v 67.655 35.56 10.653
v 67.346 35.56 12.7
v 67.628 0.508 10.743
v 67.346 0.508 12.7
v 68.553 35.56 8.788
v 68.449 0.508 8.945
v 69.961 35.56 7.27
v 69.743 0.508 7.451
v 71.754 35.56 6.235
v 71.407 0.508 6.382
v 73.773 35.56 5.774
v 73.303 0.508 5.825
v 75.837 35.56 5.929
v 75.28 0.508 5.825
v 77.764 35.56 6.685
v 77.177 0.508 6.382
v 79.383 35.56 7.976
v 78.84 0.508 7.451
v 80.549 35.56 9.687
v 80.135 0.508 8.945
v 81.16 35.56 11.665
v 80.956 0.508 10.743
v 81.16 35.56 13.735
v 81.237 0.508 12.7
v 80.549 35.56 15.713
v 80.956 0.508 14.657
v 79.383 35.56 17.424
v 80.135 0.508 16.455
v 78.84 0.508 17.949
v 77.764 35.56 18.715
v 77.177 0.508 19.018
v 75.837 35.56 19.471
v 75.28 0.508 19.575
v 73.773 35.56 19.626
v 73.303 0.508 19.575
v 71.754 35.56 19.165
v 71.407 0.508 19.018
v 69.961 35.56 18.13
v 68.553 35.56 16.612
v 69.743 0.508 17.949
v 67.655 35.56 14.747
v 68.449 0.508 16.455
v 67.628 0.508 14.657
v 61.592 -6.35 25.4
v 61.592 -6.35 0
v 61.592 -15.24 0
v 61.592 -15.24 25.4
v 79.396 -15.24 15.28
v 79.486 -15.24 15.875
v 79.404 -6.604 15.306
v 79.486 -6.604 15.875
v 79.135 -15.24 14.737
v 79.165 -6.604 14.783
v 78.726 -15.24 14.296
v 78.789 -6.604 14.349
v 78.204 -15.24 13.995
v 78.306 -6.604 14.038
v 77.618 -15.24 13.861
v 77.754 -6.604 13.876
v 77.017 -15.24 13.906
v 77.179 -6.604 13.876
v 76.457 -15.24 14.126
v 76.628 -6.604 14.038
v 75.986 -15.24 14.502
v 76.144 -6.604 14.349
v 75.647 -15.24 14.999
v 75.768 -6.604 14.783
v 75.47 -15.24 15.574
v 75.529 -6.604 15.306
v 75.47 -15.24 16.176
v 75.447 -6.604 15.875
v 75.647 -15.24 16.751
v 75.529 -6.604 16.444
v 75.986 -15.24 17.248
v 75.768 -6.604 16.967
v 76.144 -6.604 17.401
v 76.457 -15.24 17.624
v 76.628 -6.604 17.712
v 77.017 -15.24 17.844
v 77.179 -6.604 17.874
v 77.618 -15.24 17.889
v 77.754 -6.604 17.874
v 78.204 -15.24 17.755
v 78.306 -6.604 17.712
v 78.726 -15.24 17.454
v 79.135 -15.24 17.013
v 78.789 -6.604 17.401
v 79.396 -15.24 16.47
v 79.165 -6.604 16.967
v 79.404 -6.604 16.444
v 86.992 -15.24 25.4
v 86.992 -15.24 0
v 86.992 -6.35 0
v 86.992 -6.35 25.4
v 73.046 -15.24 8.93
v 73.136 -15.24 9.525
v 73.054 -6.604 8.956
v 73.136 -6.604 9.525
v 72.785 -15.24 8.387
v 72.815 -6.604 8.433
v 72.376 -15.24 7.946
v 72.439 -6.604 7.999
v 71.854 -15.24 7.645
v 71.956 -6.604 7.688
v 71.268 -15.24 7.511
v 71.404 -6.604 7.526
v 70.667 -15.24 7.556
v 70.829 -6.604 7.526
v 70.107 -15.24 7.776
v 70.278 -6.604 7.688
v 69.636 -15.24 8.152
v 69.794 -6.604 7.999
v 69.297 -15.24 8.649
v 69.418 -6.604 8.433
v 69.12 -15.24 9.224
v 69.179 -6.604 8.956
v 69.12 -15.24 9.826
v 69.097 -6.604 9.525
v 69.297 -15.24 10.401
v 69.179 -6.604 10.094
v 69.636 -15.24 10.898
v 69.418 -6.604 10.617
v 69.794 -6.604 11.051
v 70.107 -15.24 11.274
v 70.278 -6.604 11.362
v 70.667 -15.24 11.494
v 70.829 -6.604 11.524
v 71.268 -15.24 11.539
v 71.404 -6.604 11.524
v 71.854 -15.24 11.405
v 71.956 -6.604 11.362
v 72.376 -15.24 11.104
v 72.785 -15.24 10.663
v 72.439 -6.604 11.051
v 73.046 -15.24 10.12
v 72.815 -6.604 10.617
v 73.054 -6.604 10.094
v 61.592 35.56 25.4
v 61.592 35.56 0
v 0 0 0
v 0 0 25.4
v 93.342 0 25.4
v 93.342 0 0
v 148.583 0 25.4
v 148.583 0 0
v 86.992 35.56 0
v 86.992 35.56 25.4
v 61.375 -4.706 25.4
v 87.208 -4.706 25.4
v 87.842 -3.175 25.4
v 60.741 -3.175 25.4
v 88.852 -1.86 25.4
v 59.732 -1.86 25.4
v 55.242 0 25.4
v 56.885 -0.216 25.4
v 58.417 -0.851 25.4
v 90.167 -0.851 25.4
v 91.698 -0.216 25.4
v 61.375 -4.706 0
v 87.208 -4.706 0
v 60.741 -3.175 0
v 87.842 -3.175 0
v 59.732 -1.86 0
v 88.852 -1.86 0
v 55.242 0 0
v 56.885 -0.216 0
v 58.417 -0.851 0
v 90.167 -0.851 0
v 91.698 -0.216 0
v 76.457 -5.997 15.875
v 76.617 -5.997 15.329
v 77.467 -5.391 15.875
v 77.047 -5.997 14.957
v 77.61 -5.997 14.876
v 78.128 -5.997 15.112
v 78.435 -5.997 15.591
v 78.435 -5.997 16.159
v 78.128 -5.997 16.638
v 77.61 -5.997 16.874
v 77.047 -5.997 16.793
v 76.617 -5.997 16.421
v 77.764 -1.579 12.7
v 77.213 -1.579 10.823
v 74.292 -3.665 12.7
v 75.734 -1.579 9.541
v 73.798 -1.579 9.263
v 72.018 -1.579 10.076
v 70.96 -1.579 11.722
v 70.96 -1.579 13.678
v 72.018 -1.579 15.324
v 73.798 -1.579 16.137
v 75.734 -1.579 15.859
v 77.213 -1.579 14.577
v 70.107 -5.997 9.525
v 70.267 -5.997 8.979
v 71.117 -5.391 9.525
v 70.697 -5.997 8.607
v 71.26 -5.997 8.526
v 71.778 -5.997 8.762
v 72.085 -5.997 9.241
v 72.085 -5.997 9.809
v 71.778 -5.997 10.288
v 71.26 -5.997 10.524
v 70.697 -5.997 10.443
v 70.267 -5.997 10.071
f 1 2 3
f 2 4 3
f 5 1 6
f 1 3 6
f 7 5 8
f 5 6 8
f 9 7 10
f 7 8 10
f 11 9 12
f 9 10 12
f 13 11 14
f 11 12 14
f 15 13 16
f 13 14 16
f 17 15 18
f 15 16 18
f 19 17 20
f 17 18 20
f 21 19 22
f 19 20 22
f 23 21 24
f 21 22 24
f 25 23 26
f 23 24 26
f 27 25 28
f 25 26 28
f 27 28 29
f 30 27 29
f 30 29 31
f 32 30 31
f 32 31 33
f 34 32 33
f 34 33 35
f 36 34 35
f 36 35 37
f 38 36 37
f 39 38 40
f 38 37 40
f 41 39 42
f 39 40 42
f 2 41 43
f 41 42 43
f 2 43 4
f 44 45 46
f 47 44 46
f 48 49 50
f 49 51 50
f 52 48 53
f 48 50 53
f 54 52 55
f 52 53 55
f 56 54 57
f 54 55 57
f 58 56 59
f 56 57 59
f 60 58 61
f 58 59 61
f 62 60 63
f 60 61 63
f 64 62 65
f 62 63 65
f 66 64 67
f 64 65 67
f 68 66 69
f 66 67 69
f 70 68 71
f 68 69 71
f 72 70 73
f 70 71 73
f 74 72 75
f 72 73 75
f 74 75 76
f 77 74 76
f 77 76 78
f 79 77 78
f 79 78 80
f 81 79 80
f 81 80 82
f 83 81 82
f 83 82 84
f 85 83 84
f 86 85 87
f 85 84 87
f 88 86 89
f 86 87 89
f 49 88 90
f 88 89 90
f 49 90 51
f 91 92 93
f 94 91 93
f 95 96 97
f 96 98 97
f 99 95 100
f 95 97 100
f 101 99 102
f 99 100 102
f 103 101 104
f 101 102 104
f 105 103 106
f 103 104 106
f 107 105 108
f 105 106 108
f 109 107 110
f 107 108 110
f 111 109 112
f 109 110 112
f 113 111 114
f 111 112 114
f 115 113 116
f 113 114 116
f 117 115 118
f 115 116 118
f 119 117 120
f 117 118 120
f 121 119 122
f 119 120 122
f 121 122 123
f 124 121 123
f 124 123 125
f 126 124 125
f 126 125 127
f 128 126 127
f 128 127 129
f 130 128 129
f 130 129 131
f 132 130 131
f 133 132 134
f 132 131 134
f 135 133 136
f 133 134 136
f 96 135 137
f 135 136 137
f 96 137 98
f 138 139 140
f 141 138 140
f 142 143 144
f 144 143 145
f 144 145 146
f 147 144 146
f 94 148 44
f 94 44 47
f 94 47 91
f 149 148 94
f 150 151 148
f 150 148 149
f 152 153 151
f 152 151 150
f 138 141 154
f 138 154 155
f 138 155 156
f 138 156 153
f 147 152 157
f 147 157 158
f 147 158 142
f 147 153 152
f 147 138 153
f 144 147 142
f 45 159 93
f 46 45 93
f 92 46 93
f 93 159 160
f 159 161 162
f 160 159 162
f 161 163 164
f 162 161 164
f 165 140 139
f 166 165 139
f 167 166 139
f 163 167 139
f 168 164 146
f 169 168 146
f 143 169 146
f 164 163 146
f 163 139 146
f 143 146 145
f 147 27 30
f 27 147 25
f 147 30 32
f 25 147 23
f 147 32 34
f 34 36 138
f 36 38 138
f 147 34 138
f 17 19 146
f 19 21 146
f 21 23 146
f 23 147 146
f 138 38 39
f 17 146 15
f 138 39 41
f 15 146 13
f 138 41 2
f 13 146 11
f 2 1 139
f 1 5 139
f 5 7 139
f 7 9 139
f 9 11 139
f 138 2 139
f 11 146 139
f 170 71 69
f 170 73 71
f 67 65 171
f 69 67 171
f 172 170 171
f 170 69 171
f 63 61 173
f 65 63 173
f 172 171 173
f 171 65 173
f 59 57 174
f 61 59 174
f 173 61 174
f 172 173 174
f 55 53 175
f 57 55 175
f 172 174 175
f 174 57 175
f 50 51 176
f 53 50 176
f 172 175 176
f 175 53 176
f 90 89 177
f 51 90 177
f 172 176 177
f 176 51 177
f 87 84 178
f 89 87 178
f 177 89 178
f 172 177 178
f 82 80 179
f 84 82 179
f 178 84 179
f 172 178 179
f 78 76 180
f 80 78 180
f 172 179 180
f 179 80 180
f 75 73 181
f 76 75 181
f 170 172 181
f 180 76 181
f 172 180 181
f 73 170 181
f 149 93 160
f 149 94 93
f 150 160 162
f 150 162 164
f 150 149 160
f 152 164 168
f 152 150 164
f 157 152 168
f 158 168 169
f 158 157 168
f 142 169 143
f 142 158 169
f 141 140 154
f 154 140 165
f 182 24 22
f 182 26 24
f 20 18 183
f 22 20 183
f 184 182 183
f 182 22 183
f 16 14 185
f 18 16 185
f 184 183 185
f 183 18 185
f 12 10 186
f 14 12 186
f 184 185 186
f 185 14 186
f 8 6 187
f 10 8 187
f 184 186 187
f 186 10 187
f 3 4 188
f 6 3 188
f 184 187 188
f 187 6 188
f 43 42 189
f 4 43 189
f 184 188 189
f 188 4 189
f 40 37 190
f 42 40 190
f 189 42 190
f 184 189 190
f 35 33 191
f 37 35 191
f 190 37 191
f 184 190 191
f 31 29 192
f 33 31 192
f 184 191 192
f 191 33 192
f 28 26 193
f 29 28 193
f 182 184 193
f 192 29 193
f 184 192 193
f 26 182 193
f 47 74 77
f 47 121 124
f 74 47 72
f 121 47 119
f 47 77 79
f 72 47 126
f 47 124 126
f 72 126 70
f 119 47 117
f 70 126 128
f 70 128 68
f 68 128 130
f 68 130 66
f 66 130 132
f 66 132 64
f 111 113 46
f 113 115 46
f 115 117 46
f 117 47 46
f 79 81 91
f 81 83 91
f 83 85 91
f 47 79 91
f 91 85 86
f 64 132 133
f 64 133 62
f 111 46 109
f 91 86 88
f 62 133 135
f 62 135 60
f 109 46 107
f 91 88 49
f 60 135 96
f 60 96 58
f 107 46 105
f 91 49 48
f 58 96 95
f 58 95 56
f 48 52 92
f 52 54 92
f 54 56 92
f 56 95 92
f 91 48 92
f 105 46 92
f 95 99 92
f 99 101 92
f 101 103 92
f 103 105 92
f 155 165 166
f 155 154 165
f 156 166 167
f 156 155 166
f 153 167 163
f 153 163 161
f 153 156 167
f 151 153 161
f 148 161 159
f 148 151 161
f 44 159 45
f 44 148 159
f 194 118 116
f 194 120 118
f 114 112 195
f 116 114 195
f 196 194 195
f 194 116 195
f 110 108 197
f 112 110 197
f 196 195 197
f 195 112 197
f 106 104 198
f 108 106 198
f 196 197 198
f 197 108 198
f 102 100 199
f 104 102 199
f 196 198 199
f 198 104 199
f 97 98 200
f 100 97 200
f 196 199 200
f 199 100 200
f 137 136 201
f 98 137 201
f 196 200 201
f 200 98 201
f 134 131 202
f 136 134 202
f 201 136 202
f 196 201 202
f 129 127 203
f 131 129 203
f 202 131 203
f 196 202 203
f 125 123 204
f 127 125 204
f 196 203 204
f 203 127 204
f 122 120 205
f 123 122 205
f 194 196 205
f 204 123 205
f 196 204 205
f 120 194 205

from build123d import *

# Parameters (mm, degrees)
BOSS_EXTRUDE1_DEPTH                  = 25.4
F_35_64_0_54688_DIAMETER_HOLE1_D     = 13.890752
F_35_64_0_54688_DIAMETER_HOLE1_DEPTH = 35.052
F_35_64_0_54688_DIAMETER_HOLE1_TIP   = 4.173202923
F_10_32_TAPPED_HOLE1_D               = 4.0386
F_10_32_TAPPED_HOLE1_DEPTH           = 8.636
F_10_32_TAPPED_HOLE1_TIP             = 1.213317848
FILLET1_R                            = 6.35


with BuildPart() as part:
    # Sketch1 → Boss-Extrude1 (new body)
    with BuildSketch(Plane.XY):
        Polygon((0, 0), (61.591726717, 0), (61.591726717, -15.24), (86.991726717, -15.24), (86.991726717, 0), (148.583453434, 0), (86.991726717, 35.56), (61.591726717, 35.56), align=None)
    extrude(amount=BOSS_EXTRUDE1_DEPTH)

    # 35/64 (0.54688) Diameter Hole1
    with Locations(Plane(origin=(0, 35.56, 0), x_dir=(1, 0, 0), z_dir=(0, 1, 0))):
        with Locations((74.291726717, -12.7)):
            Hole(F_35_64_0_54688_DIAMETER_HOLE1_D / 2, depth=F_35_64_0_54688_DIAMETER_HOLE1_DEPTH)
            with Locations((0, 0, -(F_35_64_0_54688_DIAMETER_HOLE1_DEPTH + F_35_64_0_54688_DIAMETER_HOLE1_TIP / 2))):  # 118° drill point
                Cone(0, F_35_64_0_54688_DIAMETER_HOLE1_D / 2, F_35_64_0_54688_DIAMETER_HOLE1_TIP, mode=Mode.SUBTRACT)

    # #10-32 Tapped Hole1
    with Locations(Plane(origin=(0, -15.24, 0), x_dir=(-1, 0, 0), z_dir=(0, -1, 0))):
        with Locations((-77.466726717, -15.875), (-71.116726717, -9.525)):
            Hole(F_10_32_TAPPED_HOLE1_D / 2, depth=F_10_32_TAPPED_HOLE1_DEPTH)
            with Locations((0, 0, -(F_10_32_TAPPED_HOLE1_DEPTH + F_10_32_TAPPED_HOLE1_TIP / 2))):  # 118° drill point
                Cone(0, F_10_32_TAPPED_HOLE1_D / 2, F_10_32_TAPPED_HOLE1_TIP, mode=Mode.SUBTRACT)

    # Fillet1
    fillet1_edges = [part.edges().sort_by_distance(p)[0] for p in [
        (86.991726717, 0, 12.7),
        (61.591726717, 0, 12.7),
    ]]
    fillet(fillet1_edges, radius=FILLET1_R)


solid = part.part
